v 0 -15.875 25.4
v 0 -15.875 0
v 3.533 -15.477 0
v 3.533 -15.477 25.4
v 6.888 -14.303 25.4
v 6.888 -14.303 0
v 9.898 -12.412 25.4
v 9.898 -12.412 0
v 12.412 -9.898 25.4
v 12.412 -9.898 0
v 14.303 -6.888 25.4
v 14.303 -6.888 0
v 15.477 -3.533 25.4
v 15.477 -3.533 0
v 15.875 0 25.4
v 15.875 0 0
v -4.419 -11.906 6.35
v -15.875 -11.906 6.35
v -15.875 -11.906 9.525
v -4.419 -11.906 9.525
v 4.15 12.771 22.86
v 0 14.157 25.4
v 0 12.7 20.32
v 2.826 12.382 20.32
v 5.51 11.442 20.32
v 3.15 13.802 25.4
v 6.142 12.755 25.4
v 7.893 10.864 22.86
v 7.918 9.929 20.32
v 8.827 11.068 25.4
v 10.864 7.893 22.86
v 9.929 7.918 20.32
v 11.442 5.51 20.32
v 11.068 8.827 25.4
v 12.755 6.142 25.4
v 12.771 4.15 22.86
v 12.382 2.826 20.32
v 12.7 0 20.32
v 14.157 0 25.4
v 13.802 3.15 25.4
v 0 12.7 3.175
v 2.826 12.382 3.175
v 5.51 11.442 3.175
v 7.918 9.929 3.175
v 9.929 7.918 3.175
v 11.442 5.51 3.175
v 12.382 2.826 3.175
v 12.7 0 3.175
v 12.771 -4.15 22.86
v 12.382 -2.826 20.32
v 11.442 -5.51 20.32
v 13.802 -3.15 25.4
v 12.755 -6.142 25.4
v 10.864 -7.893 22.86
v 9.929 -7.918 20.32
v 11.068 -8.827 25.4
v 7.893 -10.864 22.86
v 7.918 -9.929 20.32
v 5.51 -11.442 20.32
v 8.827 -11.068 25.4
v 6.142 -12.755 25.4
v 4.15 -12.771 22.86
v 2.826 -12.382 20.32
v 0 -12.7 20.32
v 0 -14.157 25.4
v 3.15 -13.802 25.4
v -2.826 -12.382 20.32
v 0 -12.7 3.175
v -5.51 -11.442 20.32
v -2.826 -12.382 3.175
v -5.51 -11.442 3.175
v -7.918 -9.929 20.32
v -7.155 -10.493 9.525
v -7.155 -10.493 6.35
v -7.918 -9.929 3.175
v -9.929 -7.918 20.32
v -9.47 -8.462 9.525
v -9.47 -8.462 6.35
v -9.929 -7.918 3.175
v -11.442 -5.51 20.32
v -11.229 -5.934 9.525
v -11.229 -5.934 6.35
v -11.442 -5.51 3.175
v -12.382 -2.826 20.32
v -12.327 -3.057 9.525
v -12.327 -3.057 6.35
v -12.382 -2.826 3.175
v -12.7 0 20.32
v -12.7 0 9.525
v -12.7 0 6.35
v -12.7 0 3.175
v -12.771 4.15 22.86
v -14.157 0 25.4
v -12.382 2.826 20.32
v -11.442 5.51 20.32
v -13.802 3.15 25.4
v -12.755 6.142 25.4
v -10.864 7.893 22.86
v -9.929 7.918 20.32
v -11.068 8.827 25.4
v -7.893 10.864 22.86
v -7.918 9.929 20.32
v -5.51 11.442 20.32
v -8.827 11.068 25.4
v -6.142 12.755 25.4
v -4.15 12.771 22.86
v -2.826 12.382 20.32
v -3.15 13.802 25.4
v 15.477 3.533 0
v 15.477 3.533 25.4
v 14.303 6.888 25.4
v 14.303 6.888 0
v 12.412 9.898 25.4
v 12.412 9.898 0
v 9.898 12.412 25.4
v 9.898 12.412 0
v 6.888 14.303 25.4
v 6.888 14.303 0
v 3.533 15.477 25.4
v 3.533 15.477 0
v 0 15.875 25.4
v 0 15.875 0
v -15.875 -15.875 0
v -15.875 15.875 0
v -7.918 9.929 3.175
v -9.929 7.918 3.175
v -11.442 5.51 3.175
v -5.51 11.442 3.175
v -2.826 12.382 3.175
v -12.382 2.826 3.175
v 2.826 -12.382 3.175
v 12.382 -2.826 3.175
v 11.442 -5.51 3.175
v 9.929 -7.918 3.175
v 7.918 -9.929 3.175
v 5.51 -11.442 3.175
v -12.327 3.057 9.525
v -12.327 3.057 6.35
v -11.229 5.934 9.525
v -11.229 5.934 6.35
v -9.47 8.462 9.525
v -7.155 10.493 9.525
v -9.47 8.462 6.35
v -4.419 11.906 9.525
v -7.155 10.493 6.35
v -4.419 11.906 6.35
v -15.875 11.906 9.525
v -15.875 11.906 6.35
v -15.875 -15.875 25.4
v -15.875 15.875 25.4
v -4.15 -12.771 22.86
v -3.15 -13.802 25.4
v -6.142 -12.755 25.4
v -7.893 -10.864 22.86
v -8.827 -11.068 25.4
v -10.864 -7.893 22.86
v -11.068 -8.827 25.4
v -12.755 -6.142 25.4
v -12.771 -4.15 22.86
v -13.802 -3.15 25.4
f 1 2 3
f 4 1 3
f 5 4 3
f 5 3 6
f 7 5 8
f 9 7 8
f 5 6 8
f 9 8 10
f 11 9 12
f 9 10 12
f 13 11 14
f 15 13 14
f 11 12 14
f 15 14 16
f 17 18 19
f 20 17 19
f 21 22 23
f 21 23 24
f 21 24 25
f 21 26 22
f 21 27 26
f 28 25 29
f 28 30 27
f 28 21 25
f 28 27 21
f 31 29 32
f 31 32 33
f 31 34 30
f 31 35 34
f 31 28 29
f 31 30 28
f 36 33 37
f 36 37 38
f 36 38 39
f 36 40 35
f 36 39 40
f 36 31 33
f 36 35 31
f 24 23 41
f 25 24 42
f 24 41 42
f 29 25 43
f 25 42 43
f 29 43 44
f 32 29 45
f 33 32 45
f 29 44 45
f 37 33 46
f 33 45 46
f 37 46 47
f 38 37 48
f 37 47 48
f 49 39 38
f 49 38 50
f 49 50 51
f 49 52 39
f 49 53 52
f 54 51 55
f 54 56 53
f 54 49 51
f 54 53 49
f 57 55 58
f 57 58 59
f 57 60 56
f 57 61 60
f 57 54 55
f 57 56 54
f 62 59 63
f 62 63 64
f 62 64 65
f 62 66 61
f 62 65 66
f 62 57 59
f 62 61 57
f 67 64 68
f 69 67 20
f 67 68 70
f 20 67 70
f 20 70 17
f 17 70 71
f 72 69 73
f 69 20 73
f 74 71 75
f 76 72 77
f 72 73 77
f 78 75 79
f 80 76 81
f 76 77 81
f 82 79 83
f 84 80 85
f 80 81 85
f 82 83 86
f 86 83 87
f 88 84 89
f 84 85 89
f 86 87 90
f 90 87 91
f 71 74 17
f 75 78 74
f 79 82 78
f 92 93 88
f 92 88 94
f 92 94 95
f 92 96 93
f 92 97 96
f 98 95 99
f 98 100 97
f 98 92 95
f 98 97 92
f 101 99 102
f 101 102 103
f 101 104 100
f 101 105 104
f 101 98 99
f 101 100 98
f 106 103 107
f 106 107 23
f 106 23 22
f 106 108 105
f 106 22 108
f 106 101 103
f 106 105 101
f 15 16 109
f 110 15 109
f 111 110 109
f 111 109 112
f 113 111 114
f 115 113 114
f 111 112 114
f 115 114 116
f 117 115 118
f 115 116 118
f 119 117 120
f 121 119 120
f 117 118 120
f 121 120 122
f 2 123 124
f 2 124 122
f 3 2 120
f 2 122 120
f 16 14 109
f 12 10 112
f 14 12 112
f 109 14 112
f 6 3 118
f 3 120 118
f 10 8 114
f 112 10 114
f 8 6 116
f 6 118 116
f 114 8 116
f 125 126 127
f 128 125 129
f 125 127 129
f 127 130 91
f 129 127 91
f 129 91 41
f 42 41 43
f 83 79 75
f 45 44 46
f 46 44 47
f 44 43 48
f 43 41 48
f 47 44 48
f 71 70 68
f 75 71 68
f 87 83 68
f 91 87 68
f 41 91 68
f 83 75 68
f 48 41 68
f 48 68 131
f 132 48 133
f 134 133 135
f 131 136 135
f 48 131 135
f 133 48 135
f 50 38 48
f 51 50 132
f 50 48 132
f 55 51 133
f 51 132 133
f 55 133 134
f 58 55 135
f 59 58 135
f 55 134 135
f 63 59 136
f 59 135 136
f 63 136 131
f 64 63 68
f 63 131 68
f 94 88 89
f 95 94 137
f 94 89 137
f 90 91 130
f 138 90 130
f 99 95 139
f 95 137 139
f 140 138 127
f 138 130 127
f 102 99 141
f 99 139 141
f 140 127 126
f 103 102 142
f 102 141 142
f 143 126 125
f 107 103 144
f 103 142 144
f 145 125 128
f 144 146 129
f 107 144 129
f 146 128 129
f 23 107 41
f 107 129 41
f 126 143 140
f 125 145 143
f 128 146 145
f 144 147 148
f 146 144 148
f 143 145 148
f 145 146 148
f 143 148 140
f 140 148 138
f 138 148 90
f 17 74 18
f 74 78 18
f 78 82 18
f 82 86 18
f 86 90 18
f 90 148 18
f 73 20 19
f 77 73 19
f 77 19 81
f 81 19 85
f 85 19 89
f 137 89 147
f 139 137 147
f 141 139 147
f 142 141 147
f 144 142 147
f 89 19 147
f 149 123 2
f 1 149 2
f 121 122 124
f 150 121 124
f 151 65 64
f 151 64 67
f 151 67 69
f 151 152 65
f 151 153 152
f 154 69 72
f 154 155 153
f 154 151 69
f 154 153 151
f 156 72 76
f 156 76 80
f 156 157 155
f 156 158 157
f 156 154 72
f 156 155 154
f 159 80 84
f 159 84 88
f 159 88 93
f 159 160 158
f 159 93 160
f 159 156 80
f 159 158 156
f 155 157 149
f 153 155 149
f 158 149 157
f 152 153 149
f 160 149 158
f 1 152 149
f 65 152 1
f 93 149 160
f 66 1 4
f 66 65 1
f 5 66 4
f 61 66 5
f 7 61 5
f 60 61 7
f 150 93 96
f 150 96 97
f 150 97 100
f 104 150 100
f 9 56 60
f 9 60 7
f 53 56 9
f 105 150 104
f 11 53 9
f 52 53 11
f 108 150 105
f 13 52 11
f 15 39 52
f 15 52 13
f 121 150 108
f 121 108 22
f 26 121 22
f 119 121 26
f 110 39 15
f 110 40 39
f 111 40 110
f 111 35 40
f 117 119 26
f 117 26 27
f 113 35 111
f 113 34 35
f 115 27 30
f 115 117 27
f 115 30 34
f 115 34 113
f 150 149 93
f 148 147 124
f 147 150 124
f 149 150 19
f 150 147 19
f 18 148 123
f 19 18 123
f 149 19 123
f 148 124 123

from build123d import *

# Parameters (mm, degrees)
F1_DEPTH = 25.4
F2_R     = 12.7
F3_DEPTH = 3.175
F5_DEPTH = 12.7
F6_SIZE2 = 1.4566665597
F6_SIZE  = 5.08


with BuildPart() as f1:
    # F0 (on Top) → F1 (new body)
    with BuildSketch(Plane.XY):
        with BuildLine():
            ThreePointArc((-15.875, 0), (-11.2253201513, 11.2253201513), (0, 15.875))
            Line((0, 15.875), (-15.875, 15.875))
            Line((-15.875, 15.875), (-15.875, 0))
        make_face()
        with BuildLine():
            Line((-15.875, -15.875), (0, -15.875))
            ThreePointArc((0, -15.875), (-11.2253201513, -11.2253201513), (-15.875, 0))
            Line((-15.875, 0), (-15.875, -15.875))
        make_face()
        with BuildLine():
            Line((0, -15.875), (0, -12.7))
            ThreePointArc((0, -12.7), (-8.9802561211, -8.9802561211), (-12.7, 0))
            Line((-12.7, 0), (-15.875, 0))
            ThreePointArc((-15.875, 0), (-11.2253201513, -11.2253201513), (0, -15.875))
        make_face()
        with BuildLine():
            ThreePointArc((-12.7, 0), (-8.9802561211, 8.9802561211), (0, 12.7))
            Line((0, 12.7), (0, 15.875))
            ThreePointArc((0, 15.875), (-11.2253201513, 11.2253201513), (-15.875, 0))
            Line((-15.875, 0), (-12.7, 0))
        make_face()
        with BuildLine():
            ThreePointArc((0, 12.7), (8.9802561211, 8.9802561211), (12.7, 0))
            ThreePointArc((12.7, 0), (8.9802561211, -8.9802561211), (0, -12.7))
            Line((0, -12.7), (0, -15.875))
            ThreePointArc((0, -15.875), (11.2253201513, -11.2253201513), (15.875, 0))
            ThreePointArc((15.875, 0), (11.2253201513, 11.2253201513), (0, 15.875))
            Line((0, 15.875), (0, 12.7))
        make_face()
    extrude(amount=F1_DEPTH)

    # F2 (on face) → F3 (join)
    with BuildSketch(Plane(origin=(0, 0, 0), x_dir=(1, 0, 0), z_dir=(0, 0, -1))):
        with BuildLine():
            Line((-15.875, 15.875), (-15.875, -15.875))
            Line((-15.875, -15.875), (0, -15.875))
            ThreePointArc((0, -15.875), (15.875, 0), (0, 15.875))
            Line((0, 15.875), (-15.875, 15.875))
        make_face()
        Circle(F2_R, mode=Mode.SUBTRACT)
        Circle(F2_R)
    extrude(amount=-F3_DEPTH)

    # F4 (on face) → F5 (cut)
    with BuildSketch(Plane(origin=(-15.875, 0, 0), x_dir=(0, -1, 0), z_dir=(-1, 0, 0))):
        Polygon((0, 6.35), (0, 9.525), (-7.9375, 9.525), (-11.90625, 9.525), (-11.90625, 6.35), (-7.9375, 6.35), align=None)
        Polygon((7.9375, 9.525), (0, 9.525), (0, 6.35), (7.9375, 6.35), (11.90625, 6.35), (11.90625, 9.525), align=None)
    extrude(amount=-F5_DEPTH, mode=Mode.SUBTRACT)

    # F6
    f6_edges = [f1.edges().sort_by_distance(p)[0] for p in [
        (0, -12.7, 25.4),
    ]]
    f6_side = f1.faces().sort_by_distance((0, -12.7, 14.2875))[0]
    chamfer(f6_edges, length=F6_SIZE, length2=F6_SIZE2, reference=f6_side)


solid = f1.part
